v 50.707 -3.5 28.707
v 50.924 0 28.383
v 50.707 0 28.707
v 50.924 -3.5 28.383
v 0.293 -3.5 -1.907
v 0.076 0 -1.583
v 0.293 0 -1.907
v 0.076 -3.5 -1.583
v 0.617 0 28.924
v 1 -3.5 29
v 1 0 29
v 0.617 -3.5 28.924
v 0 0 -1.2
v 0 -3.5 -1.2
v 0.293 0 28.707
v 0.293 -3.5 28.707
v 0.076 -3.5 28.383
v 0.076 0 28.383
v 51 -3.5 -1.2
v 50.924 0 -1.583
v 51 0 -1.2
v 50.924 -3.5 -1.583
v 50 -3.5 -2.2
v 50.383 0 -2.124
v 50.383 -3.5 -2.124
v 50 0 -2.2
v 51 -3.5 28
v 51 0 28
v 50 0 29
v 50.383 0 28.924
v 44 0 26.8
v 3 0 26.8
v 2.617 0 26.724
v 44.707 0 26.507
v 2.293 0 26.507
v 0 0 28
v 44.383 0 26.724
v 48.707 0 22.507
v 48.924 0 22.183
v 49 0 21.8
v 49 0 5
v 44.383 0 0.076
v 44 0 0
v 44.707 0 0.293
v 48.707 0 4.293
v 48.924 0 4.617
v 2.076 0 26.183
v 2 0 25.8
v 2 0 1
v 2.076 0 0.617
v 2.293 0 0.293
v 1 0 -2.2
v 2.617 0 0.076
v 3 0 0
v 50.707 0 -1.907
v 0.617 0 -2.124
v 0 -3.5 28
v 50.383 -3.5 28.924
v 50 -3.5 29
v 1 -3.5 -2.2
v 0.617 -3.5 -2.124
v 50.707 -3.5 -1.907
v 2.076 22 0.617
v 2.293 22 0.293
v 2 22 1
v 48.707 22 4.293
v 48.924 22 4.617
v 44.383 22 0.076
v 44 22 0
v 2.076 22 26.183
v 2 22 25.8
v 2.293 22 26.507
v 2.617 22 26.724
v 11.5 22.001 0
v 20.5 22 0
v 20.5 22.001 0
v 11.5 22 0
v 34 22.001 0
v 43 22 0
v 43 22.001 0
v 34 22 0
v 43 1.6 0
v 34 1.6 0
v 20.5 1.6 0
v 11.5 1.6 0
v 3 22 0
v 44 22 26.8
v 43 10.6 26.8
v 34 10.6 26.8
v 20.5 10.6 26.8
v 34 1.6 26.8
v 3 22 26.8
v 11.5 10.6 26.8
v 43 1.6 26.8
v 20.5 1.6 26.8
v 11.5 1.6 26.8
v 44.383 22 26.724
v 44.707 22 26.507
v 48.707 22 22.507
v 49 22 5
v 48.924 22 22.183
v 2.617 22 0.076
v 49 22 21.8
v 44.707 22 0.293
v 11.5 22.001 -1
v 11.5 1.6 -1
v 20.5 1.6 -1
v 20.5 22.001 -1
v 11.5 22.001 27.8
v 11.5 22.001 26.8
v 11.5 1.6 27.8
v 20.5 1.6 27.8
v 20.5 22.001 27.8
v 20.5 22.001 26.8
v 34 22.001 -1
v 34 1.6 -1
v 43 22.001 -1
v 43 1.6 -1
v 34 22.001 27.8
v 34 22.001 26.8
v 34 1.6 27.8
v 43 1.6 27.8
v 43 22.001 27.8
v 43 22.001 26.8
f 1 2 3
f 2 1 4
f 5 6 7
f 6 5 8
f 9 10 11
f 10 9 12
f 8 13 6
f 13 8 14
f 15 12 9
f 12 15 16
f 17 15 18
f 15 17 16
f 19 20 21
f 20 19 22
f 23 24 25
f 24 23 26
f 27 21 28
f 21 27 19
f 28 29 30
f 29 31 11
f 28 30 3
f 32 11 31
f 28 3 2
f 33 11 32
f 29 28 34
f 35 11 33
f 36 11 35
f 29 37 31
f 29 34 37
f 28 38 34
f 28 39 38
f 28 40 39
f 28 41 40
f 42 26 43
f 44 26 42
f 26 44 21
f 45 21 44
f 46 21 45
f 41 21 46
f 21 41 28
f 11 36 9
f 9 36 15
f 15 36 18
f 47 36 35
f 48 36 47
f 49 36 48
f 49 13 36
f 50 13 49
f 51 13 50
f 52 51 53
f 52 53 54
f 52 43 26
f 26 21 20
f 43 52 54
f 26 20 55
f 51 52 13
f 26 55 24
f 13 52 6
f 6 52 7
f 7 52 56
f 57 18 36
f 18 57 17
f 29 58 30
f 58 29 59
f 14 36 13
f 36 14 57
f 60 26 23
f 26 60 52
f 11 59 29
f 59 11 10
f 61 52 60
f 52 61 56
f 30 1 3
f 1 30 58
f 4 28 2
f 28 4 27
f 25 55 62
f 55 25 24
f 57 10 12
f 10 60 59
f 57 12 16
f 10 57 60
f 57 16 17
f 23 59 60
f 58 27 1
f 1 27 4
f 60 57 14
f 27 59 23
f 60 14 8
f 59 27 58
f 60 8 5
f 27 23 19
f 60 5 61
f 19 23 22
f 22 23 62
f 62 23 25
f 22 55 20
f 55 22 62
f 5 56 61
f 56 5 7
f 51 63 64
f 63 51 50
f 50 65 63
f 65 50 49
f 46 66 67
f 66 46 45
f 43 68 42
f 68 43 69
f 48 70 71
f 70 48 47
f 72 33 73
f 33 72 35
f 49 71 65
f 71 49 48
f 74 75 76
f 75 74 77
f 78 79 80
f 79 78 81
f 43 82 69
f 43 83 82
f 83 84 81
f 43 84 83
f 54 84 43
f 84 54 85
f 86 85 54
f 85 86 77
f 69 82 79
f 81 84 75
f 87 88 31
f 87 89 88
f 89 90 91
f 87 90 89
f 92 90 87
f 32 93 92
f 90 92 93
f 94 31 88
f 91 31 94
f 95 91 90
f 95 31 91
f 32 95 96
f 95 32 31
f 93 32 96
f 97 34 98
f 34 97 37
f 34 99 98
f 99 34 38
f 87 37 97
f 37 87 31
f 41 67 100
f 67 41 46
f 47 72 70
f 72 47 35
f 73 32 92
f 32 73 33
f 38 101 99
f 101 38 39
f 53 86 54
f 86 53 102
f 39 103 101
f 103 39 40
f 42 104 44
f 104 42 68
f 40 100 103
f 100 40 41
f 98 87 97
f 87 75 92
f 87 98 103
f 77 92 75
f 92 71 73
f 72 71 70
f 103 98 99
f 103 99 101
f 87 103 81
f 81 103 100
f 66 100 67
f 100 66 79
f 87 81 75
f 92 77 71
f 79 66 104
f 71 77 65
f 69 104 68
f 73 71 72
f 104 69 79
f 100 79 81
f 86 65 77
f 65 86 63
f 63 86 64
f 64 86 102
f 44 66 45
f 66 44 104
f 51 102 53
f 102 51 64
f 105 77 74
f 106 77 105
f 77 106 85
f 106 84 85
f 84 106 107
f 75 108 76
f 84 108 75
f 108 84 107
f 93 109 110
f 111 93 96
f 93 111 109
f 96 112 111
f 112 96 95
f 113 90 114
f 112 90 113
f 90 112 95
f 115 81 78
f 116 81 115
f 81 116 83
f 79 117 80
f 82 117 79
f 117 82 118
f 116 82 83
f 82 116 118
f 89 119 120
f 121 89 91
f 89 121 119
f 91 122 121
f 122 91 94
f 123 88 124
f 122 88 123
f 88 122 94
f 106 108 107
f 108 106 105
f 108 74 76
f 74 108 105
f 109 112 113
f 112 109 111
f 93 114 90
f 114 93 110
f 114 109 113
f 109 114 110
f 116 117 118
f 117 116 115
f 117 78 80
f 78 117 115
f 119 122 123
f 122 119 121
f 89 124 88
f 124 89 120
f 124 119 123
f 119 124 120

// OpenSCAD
e=0.001;

border_w=51;
border_h=31.2;
border_d=3.5;

w=47;
h=26.8;
d=22;
chamf=4;

corner=1;

module plug(margin=0, extra_depth=0)
{
	$fn=16;

	d = d+extra_depth;
	border_w = border_w-2*corner;
	border_h = border_h-2*corner;
	w = w-2*corner;
	h = h-2*corner;
	r = corner+margin;

	color([.3,.3,.3])
	translate([corner,0,corner])
	rotate([90,0,0])
	{
		translate([0,(h-border_h)/2,0])
		linear_extrude(border_d+margin)
		hull()
		for(p=[ [0, 0],
		        [0, border_h],
		        [border_w, border_h],
		        [border_w, 0]
		])
		translate(p)
		circle(r);

		translate([(border_w-w)/2,0,-d])
		linear_extrude(d+e)
		hull()
		for (p=[ [0, 0],
		         [0, h],
		         [w-chamf, h],
		         [w, h-chamf],
		         [w, chamf],
		         [w- chamf, 0],
		])
		translate(p)
		circle(r);
	}
}

module plug_latch(margin=0)
{
	rotate([90,0,0])
	rotate([0,90,0])
	linear_extrude(9)
	{
		polygon([ [0, -1], [0, 1+margin], [9, margin]]);
	}
}

module plug_latches(margin=0)
{
	for (x=[9.5,32])
	for (y_flip=[-1, 1])
	translate([(border_w-w)/2+x,1.6, h/2])
	scale([1,1,y_flip])
	translate([0,0,h/2])
	plug_latch(margin);
}


module plug_latches_keepout(margin=0, extra_depth=0)
{
	for (x=[9.5,32])
	for (y_flip=[-1, 1])
	translate([(border_w-w)/2+x,1.6, h/2])
	scale([1,1,y_flip])
	translate([0,0,h/2])
	cube([9,d+extra_depth-1.6+e,1+margin]);
}

plug();

plug_latches();

#plug_latches_keepout();

%plug(margin=.3);
